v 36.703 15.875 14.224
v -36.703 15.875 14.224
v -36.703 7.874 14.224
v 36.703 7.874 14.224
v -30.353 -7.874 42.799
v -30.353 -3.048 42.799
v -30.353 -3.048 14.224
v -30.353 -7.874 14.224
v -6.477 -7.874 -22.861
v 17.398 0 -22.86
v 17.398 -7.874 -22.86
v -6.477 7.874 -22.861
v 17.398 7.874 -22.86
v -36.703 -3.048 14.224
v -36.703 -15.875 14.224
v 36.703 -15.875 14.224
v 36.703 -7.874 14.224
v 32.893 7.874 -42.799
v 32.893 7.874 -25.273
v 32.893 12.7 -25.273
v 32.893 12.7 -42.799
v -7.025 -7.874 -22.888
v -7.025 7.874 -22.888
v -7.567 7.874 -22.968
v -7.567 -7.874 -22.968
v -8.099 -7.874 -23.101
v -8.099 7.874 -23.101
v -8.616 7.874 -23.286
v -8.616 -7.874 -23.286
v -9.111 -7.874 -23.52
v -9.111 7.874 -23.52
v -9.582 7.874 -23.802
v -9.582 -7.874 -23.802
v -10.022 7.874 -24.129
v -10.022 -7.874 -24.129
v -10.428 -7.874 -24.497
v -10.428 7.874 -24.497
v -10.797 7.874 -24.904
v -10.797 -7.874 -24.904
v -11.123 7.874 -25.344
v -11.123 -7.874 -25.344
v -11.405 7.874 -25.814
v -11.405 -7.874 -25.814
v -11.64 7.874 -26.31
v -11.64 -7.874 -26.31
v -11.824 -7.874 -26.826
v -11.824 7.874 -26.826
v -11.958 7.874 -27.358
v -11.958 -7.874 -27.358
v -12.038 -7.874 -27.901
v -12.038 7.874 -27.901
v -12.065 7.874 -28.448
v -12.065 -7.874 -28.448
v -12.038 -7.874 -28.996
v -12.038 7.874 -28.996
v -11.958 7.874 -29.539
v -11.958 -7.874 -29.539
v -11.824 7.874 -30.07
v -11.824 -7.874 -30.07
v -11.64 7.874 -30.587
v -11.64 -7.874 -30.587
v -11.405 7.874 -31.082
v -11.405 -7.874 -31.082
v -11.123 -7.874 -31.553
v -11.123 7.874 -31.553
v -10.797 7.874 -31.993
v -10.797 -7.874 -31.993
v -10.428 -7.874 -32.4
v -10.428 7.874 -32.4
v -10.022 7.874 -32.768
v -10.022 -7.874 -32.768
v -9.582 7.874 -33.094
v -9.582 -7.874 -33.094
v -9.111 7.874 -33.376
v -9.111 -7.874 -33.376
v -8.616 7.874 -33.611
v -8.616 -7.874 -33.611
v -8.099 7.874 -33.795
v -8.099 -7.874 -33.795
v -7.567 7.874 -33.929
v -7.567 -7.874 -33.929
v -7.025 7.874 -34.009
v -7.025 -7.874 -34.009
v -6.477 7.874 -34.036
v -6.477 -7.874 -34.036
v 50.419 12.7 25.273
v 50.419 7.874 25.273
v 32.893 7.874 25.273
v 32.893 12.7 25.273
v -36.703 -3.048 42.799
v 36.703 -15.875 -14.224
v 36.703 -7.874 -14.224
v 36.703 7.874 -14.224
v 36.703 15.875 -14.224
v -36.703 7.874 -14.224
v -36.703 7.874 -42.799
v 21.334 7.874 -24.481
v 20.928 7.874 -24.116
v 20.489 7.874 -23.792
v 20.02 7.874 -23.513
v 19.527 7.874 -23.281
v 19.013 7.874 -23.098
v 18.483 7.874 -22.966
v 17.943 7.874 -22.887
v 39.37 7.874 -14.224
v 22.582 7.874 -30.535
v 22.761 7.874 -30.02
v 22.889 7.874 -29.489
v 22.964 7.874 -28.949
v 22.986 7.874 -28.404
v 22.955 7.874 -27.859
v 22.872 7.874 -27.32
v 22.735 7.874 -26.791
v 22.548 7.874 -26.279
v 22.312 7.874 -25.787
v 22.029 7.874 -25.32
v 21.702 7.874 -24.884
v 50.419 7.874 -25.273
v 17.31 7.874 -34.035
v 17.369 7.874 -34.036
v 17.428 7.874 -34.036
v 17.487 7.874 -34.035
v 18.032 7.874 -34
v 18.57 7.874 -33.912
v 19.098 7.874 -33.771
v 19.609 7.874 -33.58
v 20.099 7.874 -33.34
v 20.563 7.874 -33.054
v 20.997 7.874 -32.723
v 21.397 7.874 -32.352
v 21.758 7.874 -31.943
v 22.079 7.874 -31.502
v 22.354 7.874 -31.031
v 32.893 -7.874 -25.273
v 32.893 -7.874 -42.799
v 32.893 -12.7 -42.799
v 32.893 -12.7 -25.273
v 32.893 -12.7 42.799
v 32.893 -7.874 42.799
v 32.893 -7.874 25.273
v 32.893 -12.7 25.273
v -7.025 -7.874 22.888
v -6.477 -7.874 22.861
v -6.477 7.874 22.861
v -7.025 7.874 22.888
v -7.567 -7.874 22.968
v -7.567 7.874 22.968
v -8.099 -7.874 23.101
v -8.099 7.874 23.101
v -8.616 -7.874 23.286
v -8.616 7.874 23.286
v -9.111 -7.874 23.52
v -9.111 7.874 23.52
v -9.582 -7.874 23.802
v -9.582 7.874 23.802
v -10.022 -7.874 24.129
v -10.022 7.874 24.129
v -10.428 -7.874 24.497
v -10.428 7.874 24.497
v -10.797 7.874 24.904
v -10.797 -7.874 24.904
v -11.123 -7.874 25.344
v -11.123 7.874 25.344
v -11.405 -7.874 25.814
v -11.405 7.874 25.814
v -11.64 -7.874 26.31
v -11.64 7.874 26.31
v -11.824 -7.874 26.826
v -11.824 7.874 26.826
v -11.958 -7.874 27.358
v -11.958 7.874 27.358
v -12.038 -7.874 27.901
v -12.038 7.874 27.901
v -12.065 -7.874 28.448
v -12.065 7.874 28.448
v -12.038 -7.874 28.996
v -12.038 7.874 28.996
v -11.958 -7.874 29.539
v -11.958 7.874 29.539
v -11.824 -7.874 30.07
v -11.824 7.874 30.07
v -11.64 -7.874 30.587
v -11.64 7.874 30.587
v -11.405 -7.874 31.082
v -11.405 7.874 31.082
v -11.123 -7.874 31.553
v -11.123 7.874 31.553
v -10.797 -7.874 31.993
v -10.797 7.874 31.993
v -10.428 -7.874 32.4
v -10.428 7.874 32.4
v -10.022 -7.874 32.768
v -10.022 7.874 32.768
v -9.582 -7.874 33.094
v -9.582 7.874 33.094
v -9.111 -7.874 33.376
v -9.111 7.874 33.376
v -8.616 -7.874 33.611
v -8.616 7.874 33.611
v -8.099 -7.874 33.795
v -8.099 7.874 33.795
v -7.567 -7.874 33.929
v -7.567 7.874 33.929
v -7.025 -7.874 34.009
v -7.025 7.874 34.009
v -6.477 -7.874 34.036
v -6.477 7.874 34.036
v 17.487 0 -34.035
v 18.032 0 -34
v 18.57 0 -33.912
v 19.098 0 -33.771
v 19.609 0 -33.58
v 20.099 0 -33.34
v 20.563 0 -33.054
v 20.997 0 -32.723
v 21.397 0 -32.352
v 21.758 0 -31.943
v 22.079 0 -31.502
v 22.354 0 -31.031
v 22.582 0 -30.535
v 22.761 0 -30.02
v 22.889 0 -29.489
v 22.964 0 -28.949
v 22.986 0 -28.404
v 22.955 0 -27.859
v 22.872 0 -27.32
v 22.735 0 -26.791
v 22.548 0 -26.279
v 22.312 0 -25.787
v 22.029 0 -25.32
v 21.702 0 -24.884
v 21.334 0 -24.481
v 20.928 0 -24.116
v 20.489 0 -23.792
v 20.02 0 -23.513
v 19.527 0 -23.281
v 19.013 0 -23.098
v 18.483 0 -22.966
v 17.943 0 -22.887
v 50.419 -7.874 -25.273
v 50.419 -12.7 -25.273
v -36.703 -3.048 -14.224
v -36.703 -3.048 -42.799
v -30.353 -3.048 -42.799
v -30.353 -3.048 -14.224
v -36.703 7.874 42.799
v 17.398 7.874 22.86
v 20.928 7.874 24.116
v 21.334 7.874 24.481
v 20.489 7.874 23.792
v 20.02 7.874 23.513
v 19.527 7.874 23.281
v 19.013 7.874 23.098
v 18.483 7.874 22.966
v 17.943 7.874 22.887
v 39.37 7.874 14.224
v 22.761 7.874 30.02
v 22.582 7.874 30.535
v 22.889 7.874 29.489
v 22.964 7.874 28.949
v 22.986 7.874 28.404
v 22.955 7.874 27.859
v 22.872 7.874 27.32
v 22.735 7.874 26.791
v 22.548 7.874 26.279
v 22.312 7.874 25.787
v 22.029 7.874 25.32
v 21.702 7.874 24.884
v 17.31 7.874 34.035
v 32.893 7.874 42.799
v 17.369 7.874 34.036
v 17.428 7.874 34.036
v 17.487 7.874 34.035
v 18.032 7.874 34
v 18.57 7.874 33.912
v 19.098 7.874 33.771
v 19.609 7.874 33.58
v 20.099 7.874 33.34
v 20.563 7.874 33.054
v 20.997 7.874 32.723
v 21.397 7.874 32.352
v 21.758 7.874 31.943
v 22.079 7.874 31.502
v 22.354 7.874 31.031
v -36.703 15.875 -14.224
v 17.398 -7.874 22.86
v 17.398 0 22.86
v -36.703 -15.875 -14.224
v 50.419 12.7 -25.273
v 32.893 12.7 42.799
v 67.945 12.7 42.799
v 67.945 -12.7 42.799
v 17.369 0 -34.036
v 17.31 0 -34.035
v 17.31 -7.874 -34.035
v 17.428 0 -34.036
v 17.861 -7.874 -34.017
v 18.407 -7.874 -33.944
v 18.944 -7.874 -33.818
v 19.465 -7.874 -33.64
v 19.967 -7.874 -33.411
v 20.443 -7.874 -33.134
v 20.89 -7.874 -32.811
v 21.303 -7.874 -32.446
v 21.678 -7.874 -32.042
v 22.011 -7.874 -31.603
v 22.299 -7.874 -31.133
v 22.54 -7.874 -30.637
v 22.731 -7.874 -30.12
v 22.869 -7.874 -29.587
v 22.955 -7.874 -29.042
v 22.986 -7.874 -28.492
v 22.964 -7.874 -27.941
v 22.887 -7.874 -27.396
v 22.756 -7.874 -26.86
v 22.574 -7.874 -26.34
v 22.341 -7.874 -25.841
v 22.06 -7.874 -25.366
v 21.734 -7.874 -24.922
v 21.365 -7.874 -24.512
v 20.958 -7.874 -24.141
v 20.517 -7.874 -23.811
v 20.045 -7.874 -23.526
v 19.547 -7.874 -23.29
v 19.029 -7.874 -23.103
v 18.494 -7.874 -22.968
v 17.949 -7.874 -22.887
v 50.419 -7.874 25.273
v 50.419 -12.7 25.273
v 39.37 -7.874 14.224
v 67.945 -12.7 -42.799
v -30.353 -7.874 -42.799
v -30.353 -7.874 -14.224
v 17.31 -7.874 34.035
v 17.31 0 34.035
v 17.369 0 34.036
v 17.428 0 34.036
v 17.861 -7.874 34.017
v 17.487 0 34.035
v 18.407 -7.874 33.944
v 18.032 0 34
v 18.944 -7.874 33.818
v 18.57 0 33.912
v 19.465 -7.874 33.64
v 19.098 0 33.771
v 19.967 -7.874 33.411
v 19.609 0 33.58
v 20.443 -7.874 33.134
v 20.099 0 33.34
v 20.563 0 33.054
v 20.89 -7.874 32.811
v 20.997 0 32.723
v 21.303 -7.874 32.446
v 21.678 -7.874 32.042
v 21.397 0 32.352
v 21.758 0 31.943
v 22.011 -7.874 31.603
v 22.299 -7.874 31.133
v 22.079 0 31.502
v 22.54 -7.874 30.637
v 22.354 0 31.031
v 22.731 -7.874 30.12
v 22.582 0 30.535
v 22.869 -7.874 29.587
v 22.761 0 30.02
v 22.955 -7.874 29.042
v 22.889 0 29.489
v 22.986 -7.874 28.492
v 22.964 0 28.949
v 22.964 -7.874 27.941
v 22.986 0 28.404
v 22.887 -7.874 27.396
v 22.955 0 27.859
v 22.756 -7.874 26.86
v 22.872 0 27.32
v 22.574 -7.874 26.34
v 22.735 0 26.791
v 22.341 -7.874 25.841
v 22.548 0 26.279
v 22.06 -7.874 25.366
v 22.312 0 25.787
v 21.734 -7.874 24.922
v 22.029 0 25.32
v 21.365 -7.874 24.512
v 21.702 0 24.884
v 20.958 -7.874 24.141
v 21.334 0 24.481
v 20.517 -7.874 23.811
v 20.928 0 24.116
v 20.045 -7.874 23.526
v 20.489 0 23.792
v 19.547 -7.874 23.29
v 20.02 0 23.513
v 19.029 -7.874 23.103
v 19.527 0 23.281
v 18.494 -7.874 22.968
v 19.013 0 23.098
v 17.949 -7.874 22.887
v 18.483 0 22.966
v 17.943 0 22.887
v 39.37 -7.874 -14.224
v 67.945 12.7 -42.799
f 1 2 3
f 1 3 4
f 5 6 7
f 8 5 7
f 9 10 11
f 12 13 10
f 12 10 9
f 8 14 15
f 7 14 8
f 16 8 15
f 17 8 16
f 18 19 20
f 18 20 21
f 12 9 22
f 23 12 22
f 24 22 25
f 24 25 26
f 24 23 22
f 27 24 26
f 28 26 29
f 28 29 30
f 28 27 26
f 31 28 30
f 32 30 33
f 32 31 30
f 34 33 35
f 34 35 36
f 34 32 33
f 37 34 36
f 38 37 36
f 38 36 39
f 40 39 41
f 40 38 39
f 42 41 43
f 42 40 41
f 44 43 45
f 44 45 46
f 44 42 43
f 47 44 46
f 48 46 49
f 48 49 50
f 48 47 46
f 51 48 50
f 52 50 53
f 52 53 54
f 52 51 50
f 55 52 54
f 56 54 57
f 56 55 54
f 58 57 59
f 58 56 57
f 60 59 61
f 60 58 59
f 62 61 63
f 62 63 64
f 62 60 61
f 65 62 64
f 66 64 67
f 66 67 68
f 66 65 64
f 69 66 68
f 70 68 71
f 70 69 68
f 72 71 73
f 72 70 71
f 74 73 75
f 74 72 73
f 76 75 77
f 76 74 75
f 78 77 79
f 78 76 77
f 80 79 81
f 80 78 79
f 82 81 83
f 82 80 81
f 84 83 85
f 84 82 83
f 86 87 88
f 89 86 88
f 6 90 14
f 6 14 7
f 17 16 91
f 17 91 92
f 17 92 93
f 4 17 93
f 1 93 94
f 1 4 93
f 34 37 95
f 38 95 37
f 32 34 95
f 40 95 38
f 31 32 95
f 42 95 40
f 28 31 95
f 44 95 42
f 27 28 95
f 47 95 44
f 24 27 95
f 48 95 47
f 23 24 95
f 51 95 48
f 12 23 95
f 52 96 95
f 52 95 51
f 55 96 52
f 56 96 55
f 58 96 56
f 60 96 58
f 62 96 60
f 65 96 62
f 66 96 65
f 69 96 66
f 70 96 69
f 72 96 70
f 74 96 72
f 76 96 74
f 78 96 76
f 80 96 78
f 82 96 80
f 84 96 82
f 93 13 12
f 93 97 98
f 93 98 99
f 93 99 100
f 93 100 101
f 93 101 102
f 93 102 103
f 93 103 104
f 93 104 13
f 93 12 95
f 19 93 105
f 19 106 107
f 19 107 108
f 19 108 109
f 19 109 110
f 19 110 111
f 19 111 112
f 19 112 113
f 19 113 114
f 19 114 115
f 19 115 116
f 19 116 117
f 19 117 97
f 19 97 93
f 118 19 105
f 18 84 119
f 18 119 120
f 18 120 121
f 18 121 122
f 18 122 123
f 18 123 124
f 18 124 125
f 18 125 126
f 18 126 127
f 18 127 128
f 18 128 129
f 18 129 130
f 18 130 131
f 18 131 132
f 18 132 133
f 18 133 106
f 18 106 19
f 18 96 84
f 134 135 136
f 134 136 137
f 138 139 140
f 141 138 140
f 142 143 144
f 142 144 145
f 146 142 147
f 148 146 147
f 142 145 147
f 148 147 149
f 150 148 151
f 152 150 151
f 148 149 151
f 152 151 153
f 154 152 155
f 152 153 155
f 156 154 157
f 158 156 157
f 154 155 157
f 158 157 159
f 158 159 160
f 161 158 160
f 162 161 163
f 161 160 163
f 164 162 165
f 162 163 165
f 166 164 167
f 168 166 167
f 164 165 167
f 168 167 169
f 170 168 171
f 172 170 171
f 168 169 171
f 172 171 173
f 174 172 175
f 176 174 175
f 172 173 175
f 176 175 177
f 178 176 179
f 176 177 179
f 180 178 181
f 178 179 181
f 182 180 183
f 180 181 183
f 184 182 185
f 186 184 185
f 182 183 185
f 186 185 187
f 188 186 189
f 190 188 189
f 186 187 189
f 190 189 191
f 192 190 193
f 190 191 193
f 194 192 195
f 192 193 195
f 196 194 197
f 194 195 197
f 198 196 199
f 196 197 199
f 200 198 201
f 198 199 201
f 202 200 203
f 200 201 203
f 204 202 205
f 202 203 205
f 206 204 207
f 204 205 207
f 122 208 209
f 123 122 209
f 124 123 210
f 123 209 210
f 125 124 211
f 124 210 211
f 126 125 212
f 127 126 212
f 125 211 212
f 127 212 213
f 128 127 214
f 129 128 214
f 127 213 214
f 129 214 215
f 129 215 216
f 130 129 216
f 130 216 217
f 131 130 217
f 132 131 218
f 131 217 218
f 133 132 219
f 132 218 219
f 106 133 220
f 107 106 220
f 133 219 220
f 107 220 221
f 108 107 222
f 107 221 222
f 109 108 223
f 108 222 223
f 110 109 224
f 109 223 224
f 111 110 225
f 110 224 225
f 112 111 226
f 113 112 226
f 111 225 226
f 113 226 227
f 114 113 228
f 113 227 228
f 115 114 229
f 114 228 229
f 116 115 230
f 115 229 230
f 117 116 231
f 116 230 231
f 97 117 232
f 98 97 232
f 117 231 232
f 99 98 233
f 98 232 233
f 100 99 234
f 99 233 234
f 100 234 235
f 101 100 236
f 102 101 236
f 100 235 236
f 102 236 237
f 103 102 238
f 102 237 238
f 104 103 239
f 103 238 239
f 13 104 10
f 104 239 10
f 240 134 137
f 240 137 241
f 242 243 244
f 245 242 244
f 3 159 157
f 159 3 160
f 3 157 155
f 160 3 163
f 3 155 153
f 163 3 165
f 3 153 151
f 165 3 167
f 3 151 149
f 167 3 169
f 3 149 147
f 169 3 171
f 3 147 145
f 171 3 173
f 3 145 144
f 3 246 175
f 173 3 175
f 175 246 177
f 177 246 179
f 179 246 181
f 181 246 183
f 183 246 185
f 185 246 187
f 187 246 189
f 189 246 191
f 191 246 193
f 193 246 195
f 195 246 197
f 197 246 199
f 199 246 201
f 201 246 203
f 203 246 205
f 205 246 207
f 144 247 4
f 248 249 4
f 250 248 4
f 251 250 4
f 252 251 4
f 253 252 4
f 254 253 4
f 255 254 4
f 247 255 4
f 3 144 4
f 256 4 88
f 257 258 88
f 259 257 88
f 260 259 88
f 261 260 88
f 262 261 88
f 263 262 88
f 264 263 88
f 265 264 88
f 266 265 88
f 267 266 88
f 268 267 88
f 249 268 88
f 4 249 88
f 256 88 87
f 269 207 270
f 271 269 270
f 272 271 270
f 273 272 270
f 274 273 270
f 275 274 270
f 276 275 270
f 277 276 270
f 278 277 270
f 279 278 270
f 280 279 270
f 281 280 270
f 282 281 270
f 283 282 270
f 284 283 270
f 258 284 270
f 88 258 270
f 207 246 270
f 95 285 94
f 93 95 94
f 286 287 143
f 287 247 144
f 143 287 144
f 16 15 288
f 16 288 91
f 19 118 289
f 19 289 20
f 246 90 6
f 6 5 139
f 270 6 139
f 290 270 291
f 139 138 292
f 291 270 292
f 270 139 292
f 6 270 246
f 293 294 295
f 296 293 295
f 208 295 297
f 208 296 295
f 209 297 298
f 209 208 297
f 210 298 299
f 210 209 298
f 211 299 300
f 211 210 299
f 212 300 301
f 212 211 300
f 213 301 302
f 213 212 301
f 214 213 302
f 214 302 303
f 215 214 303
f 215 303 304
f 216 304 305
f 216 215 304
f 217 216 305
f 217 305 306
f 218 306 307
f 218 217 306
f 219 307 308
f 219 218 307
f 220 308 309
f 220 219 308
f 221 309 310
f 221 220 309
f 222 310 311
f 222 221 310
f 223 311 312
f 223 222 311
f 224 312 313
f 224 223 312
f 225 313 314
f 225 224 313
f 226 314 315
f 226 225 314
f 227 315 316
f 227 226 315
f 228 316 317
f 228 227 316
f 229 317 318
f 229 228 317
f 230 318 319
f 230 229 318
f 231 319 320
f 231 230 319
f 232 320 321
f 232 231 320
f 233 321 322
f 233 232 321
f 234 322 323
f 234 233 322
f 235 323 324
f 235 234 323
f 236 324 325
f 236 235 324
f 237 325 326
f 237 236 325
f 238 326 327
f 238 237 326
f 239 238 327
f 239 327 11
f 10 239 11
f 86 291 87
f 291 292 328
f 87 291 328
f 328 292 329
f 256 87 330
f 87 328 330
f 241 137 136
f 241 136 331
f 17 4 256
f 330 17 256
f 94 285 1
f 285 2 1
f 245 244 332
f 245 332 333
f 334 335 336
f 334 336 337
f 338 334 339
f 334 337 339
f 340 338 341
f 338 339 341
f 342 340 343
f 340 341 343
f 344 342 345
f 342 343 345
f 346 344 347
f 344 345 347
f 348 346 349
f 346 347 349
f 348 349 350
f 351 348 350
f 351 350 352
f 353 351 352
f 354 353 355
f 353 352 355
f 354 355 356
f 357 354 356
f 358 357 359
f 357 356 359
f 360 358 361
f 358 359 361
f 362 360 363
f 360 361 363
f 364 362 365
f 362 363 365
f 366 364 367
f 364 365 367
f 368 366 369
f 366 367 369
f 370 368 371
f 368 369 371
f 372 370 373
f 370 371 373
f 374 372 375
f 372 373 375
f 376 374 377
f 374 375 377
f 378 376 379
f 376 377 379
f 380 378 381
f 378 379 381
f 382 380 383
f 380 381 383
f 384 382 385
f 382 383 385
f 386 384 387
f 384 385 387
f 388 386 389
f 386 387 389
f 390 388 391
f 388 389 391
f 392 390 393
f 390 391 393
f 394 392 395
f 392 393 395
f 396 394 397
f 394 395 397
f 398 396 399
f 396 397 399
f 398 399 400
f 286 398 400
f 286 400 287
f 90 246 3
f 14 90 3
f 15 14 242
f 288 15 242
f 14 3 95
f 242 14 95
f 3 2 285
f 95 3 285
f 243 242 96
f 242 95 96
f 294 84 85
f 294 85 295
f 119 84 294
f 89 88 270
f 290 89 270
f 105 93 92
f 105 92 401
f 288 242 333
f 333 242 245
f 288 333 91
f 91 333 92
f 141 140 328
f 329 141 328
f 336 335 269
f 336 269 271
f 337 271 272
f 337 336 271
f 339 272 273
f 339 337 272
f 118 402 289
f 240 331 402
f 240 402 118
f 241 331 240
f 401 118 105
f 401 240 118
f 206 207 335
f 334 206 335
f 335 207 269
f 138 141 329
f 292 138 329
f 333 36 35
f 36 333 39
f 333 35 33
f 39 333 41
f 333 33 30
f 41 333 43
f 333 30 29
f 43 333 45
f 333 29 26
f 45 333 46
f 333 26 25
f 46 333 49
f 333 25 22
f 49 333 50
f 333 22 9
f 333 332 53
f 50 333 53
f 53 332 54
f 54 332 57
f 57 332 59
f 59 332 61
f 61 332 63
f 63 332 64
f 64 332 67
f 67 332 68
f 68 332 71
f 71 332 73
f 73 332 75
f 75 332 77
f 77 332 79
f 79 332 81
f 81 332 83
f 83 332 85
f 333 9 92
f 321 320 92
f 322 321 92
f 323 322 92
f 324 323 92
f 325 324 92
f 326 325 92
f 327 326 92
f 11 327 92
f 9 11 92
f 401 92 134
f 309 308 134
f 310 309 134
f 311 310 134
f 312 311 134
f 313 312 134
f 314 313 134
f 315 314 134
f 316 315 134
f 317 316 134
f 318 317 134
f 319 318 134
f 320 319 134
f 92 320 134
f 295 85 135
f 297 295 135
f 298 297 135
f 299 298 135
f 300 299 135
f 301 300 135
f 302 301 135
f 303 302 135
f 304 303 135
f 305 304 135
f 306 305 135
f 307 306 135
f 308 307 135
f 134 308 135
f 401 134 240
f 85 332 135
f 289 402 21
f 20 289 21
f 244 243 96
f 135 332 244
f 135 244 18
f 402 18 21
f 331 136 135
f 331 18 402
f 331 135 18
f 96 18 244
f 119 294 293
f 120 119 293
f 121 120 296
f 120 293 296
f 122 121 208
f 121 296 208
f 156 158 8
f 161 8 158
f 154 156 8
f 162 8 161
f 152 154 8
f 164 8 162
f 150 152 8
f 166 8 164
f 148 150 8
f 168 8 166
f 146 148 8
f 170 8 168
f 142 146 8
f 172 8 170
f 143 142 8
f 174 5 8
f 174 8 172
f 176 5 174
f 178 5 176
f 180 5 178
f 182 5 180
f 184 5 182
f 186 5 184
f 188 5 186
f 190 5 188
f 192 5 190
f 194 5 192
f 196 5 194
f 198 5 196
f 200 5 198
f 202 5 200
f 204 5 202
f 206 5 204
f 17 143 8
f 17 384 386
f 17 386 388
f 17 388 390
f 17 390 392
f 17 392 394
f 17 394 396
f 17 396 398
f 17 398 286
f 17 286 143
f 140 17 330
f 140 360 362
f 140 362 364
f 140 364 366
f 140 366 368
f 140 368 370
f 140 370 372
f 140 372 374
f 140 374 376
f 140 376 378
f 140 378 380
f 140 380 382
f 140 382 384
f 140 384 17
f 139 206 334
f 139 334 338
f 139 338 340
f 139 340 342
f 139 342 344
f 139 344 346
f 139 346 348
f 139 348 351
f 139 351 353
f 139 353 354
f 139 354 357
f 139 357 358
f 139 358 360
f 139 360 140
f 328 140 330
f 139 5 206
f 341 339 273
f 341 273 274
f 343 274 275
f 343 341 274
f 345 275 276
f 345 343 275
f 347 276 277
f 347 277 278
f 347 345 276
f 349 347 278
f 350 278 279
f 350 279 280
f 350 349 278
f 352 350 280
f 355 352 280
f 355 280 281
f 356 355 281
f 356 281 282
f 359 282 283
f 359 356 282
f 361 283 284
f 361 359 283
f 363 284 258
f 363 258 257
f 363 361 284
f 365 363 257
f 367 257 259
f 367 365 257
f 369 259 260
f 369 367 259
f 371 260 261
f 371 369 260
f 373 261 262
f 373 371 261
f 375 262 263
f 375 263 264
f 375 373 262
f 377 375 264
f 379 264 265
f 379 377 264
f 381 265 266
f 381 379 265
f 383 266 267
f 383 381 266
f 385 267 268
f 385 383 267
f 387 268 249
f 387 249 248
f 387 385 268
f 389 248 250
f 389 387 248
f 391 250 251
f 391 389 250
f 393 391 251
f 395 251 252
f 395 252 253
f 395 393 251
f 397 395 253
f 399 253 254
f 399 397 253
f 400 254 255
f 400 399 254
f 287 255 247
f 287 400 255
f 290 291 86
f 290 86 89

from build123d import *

# Parameters (mm, degrees)
F0_W      = 73.406
F0_H      = 31.75
F1_DEPTH  = 14.224
F2_W      = 6.35
F2_H      = 28.575
F3_DEPTH  = 7.874
F5_DEPTH  = 7.874
F6_DEPTH  = 3.048
F8_DEPTH  = 4.826
F10_DEPTH = 4.826


with BuildPart() as f1:
    # F0 (on Top) → F1 (new body)
    with BuildSketch(Plane.XY):
        Rectangle(F0_W, F0_H)
    extrude(amount=F1_DEPTH)

    # F2 (on Front) → F3 (join)
    with BuildSketch(Plane.XZ):
        Polygon((-30.353, 42.799), (-30.353, 14.224), (39.37, 14.224), (50.3207743978, 25.1747743978), (32.893, 25.1747743978), (32.893, 42.799), align=None)
        with BuildLine():
            ThreePointArc((-6.4773515256, 22.860703056), (-12.0649999994, 28.4484341748), (-6.4771862369, 34.0360000025))
            Line((-6.4771862369, 34.0360000025), (17.3101380153, 34.035296348))
            ThreePointArc((17.3101380153, 34.035296348), (17.3987768094, 34.0359967795), (17.4874155619, 34.035291104))
            ThreePointArc((17.4874155619, 34.035291104), (22.9864344307, 28.4035107074), (17.3984462114, 22.8599967844))
            Line((17.3984462114, 22.8599967844), (-6.4773515256, 22.860703056))
        make_face(mode=Mode.SUBTRACT)
        Polygon((67.945, 42.799), (32.893, 42.799), (32.893, 25.1747743978), (50.3207743978, 25.1747743978), align=None)
        with Locations((-33.528, 28.5115)):
            Rectangle(F2_W, F2_H)
    extrude(amount=-F3_DEPTH)

    # F4 (on face) → F5 (join)
    with BuildSketch(Plane.XZ):
        Polygon((67.945, 42.799), (-30.353, 42.799), (-30.353, 14.224), (36.703, 14.224), (39.37, 14.224), align=None)
        with BuildLine():
            ThreePointArc((17.3101380153, 34.035296348), (22.9864370529, 28.4921522689), (17.3984462114, 22.8599967844))
            Line((17.3984462114, 22.8599967844), (-6.4773515256, 22.860703056))
            ThreePointArc((-6.4773515256, 22.860703056), (-12.0649999994, 28.4484341748), (-6.4771862369, 34.0360000025))
            Line((-6.4771862369, 34.0360000025), (17.3101380153, 34.035296348))
        make_face(mode=Mode.SUBTRACT)
    extrude(amount=F5_DEPTH)

    # F6 (add): a face of the model
    f6_faces = [f1.faces().sort_by_distance(p)[0] for p in [
        (-33.528, 0, 28.5115),
    ]]
    extrude(f6_faces, amount=F6_DEPTH)

    # F7 (on face) → F8 (join)
    with BuildSketch(Plane.XZ.offset(7.874)):
        Polygon((50.419, 25.273), (67.945, 42.799), (32.893, 42.799), (32.893, 25.273), align=None)
    extrude(amount=F8_DEPTH)

    # F9 (on face) → F10 (join)
    with BuildSketch(Plane(origin=(0, 7.874, 0), x_dir=(-1, 0, 0), z_dir=(0, 1, 0))):
        Polygon((-32.893, 42.799), (-67.945, 42.799), (-50.419, 25.273), (-32.893, 25.273), align=None)
    extrude(amount=F10_DEPTH)

    # F11: F1 across plane


with BuildPart() as f1_1:
    add(f1.part)
    add(f1.part.mirror(Plane.XY))


solid = f1_1.part
